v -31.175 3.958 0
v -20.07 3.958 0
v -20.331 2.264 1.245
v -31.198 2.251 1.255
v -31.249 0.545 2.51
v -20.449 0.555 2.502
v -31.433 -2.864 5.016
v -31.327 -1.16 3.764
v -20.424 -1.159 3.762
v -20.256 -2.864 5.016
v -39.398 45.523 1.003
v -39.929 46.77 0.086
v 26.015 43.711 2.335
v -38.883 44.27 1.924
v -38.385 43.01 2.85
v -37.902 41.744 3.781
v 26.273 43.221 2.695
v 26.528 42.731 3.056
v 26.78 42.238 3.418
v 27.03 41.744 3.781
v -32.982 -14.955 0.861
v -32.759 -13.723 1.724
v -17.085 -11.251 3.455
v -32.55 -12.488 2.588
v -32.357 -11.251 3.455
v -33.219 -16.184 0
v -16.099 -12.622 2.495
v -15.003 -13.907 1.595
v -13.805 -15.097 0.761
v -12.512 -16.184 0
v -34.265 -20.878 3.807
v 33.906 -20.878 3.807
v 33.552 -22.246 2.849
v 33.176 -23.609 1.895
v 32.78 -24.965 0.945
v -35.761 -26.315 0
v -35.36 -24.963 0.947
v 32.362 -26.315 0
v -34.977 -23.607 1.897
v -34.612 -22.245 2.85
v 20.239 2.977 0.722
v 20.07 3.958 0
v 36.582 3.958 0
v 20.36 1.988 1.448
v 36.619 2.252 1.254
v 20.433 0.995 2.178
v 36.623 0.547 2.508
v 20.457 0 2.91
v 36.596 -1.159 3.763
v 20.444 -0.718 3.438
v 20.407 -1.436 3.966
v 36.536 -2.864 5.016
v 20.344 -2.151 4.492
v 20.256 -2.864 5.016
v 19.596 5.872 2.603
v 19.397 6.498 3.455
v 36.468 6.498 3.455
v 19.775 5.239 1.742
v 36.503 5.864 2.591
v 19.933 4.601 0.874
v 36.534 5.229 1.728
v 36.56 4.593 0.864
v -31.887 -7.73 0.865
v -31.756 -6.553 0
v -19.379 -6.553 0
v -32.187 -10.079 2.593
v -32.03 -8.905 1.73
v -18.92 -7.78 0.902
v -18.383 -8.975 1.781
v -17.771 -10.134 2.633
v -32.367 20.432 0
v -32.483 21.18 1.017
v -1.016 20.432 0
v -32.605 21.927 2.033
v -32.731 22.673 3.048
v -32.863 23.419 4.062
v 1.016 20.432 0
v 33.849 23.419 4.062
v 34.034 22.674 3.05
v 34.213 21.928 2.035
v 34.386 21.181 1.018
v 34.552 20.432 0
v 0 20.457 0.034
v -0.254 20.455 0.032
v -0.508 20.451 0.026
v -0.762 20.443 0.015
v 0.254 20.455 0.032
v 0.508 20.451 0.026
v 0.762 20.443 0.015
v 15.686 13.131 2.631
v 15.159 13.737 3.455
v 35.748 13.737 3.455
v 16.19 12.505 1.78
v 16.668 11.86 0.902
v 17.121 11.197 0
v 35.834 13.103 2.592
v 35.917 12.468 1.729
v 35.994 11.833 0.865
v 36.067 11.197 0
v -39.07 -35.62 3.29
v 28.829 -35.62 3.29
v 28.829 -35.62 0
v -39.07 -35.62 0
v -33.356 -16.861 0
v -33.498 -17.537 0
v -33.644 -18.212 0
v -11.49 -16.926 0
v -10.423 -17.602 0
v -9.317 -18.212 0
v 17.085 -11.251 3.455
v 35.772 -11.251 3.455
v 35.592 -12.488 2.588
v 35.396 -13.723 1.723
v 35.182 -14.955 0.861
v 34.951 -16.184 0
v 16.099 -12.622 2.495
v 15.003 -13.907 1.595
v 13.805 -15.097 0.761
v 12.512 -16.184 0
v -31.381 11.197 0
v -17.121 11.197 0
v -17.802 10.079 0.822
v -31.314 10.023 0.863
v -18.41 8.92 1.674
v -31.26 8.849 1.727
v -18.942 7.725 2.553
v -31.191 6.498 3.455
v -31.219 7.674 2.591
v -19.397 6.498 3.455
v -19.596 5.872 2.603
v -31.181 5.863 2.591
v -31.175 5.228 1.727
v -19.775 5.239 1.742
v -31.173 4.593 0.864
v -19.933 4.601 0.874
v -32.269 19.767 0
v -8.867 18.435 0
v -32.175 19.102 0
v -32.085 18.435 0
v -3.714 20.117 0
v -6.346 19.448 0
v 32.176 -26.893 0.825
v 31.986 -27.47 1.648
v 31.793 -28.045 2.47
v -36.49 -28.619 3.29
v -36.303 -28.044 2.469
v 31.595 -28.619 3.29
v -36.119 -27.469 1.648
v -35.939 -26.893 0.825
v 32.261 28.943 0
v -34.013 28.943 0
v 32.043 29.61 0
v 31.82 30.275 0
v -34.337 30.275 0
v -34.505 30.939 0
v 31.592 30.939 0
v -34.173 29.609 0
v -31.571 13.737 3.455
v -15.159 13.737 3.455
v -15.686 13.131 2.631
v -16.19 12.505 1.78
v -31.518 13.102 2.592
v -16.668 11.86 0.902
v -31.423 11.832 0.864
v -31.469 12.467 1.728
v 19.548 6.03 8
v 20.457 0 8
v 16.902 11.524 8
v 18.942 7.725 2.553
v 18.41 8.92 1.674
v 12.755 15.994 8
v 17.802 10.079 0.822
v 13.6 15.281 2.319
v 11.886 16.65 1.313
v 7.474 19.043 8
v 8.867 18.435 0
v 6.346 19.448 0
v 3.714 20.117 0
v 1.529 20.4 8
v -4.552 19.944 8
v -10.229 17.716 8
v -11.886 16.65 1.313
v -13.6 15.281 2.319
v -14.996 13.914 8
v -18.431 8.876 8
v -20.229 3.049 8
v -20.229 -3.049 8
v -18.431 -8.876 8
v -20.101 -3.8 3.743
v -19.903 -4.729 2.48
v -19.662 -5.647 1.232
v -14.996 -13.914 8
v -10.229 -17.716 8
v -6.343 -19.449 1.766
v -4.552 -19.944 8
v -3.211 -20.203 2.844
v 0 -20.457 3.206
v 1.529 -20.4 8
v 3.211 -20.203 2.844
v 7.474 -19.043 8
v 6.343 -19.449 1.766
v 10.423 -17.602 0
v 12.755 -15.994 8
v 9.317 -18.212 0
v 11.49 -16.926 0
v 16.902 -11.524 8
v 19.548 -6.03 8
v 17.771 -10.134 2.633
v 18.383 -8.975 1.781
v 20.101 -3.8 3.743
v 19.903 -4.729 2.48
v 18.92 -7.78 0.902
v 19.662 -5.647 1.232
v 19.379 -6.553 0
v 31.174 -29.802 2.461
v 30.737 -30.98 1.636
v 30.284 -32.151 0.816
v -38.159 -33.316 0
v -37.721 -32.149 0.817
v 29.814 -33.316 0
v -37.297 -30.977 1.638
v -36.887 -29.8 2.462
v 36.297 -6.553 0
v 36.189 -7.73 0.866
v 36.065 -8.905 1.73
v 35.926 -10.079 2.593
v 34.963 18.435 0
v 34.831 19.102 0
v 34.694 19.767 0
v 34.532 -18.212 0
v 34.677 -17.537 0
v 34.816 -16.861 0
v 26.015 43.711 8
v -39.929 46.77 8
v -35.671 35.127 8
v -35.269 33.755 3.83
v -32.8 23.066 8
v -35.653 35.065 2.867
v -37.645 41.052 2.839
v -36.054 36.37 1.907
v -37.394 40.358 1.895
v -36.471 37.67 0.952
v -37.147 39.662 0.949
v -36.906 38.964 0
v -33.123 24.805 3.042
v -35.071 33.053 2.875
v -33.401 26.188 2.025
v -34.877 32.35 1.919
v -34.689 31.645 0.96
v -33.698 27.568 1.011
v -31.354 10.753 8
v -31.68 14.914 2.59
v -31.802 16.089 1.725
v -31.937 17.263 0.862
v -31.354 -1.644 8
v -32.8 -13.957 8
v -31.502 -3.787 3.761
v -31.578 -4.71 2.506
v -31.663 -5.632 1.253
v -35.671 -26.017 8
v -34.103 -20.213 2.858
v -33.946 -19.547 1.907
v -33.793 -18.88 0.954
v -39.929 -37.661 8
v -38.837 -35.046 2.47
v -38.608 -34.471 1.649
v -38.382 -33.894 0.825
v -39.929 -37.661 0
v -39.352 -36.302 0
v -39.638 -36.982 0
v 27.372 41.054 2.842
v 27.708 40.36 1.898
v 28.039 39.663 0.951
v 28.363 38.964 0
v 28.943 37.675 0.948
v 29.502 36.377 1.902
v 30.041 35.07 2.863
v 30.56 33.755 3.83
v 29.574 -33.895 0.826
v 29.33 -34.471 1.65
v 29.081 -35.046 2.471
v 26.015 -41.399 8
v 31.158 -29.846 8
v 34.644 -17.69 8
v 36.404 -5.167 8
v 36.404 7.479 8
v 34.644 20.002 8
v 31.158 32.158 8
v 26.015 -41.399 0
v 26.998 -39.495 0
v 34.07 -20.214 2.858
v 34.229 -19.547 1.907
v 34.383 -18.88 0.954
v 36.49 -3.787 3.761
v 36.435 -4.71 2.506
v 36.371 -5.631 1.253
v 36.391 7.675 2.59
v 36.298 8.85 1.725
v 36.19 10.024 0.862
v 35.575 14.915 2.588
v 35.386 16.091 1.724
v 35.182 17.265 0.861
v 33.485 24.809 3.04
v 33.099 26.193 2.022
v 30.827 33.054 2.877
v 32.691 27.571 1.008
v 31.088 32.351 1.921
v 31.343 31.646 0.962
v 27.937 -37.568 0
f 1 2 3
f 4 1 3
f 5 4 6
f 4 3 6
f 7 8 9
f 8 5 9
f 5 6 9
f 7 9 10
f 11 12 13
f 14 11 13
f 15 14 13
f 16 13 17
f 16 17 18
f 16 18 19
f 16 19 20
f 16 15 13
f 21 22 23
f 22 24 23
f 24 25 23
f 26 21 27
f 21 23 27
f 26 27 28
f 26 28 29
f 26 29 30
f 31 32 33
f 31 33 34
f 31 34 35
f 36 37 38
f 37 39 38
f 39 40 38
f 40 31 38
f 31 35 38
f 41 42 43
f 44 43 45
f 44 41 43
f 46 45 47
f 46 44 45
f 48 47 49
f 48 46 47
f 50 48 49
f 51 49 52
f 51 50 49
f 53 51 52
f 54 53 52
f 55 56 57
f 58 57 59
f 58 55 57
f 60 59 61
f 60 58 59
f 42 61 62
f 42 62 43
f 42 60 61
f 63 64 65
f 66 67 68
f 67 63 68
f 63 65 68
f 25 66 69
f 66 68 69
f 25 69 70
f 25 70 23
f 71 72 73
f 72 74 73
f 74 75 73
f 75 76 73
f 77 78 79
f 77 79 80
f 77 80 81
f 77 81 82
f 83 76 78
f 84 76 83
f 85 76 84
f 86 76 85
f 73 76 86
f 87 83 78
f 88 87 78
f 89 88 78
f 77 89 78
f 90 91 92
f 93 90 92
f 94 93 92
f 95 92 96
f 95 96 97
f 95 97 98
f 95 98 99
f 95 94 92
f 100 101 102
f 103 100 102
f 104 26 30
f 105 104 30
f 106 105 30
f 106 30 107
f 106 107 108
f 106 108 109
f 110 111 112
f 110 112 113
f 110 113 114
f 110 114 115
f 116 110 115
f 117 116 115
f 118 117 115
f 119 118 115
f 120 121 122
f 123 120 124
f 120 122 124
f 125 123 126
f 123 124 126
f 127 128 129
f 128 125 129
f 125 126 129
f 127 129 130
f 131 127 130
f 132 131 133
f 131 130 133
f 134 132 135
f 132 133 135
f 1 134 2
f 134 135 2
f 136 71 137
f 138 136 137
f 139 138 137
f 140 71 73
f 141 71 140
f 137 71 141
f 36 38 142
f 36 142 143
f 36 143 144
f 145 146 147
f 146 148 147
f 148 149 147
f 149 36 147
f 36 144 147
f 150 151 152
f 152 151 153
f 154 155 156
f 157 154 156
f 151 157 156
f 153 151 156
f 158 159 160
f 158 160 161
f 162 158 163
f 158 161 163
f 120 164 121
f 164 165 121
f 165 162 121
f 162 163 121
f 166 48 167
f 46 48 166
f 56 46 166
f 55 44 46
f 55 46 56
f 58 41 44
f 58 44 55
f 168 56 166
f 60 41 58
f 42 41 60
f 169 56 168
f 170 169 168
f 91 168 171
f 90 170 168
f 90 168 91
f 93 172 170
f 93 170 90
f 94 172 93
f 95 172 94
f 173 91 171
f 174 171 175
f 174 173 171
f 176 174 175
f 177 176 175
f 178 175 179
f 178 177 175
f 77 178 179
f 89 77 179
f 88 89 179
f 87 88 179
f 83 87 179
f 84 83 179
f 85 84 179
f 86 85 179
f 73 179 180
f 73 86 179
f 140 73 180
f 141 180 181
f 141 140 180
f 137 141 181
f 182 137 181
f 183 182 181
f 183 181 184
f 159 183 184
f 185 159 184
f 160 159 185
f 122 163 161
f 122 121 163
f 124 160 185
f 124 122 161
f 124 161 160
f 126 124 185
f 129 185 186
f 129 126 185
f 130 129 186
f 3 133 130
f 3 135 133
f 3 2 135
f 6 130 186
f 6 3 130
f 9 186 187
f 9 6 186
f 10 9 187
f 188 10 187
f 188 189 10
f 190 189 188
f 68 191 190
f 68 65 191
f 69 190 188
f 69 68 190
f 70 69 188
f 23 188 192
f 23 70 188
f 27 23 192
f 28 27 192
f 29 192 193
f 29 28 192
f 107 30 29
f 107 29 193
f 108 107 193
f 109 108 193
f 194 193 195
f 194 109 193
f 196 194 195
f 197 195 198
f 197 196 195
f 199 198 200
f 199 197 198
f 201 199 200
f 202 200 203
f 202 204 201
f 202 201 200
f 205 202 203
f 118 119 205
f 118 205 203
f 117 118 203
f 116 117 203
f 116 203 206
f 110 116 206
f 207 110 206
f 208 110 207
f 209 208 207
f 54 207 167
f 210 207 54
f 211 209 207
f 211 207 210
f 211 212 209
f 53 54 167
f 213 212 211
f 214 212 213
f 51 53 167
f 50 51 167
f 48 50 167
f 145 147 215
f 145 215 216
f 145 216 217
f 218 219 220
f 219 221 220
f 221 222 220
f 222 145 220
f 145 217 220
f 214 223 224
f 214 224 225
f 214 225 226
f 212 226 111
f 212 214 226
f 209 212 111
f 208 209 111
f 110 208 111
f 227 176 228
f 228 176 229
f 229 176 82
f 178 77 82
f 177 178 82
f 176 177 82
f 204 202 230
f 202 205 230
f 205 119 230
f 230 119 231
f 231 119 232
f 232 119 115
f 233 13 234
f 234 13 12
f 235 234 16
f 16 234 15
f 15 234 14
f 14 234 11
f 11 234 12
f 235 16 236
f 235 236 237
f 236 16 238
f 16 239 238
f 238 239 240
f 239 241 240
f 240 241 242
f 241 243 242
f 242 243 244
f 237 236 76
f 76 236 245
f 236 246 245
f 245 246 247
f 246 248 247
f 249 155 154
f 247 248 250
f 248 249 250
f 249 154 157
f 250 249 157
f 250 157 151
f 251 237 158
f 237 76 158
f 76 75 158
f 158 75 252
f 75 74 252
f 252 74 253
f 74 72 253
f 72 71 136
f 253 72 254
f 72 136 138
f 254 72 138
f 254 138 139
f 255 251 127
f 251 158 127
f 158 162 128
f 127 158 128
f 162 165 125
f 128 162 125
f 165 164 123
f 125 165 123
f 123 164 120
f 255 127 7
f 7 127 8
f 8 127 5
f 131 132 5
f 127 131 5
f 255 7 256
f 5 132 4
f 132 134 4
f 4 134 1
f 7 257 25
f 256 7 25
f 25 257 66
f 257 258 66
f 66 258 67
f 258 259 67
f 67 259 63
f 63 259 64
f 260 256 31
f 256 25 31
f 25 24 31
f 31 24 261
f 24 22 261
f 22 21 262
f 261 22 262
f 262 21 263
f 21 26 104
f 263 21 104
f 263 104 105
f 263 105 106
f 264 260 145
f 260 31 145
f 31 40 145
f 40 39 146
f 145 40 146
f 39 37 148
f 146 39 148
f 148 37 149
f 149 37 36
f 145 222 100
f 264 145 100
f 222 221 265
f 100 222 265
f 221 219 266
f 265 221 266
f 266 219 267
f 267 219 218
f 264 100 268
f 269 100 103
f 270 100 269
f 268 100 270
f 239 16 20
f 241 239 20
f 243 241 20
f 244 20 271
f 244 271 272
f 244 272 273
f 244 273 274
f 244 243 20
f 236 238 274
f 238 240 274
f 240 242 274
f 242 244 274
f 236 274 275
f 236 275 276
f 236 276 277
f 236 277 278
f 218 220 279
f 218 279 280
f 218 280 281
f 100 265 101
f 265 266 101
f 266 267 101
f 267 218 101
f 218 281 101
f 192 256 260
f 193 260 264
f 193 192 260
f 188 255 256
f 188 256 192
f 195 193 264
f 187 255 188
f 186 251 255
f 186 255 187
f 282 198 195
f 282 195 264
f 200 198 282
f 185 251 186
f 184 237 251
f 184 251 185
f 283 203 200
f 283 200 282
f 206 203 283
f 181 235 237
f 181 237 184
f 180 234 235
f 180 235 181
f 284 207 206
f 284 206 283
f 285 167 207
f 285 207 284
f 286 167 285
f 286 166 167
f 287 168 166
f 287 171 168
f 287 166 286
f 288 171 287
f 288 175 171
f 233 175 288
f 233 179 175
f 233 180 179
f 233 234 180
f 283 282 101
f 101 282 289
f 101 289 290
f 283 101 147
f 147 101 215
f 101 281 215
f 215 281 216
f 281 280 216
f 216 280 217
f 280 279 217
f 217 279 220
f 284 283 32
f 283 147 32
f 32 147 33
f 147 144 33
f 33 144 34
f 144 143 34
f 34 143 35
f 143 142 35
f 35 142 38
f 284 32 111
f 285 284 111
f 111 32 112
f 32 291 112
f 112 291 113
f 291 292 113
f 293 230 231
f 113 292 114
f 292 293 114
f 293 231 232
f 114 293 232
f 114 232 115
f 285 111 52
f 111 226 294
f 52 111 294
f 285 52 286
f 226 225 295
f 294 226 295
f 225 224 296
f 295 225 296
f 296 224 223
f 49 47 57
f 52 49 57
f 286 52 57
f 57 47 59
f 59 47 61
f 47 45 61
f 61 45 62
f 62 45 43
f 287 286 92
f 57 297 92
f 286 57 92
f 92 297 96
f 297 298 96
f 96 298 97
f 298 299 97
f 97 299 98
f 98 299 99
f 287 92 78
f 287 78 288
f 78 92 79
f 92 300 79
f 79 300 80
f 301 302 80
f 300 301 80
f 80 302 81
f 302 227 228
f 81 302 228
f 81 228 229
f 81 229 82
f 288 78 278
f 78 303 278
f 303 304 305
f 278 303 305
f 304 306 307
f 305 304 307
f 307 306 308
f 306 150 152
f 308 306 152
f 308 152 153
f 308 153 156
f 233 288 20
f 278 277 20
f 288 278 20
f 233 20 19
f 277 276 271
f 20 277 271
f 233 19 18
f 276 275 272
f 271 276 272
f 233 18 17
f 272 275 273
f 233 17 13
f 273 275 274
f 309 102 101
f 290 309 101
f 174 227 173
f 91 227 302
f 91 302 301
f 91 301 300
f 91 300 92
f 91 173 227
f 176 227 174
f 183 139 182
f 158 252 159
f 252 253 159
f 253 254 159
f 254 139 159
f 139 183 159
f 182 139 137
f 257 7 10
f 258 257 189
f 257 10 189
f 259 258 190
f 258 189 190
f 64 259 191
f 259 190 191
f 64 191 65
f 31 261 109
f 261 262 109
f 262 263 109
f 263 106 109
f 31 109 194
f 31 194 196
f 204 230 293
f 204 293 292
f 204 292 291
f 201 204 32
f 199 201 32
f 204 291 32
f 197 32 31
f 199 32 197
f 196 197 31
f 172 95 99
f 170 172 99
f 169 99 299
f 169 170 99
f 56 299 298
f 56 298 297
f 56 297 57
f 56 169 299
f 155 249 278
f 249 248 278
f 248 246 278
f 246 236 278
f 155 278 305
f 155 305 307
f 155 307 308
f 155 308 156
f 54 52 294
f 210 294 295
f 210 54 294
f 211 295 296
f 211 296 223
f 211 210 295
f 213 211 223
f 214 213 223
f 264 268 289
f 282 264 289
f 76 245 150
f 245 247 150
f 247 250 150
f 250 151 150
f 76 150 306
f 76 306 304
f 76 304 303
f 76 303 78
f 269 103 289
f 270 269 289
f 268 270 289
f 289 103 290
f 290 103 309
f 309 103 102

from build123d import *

# Parameters (mm, degrees)
F0_R          = 20.4570134616
F1_DEPTH      = 8
F3_DEPTH      = 39.9303750525
F3_DEPTH_BACK = 36.6262506595


with BuildPart() as f1:
    # F0 (on Top) → F1 (new body)
    with BuildSketch(Plane.XY):
        with BuildLine():
            Line((26.0145924985, 43.7105707824), (-39.9293750525, 46.7698224776))
            ThreePointArc((-39.9293750525, 46.7698224776), (-31.1732722705, 4.5545801964), (-39.9293750525, -37.6606620848))
            Line((-39.9293750525, -37.6606620848), (26.0145924985, -41.3985941777))
            ThreePointArc((26.0145924985, -41.3985941777), (36.6252506595, 1.1559883023), (26.0145924985, 43.7105707824))
        make_face()
        Circle(F0_R, mode=Mode.SUBTRACT)
    extrude(amount=F1_DEPTH)

    # F2 (on Right) → F3 (cut, two sides)
    with BuildSketch(Plane.YZ) as f3_sk:
        Polygon((46.8867681921, -9.8310960457), (46.8867681921, 0), (41.7443476617, 3.7811910734), (38.9640604703, 0), (33.7552301478, 3.8300217966), (30.2384872583, -0.9527491568), (23.4185017684, 4.0619454024), (19.7312268381, -0.9527491568), (13.7370294066, 3.4547483798), (11.1967735762, 0), (6.498315167, 3.4547483798), (3.9580593366, 0), (-2.8641208355, 5.0163082959), (-6.5525823368, 0), (-11.251040746, 3.4547483798), (-17.5447277725, -0.9527491568), (-20.8783004803, 3.8074266864), (-26.315116211, 0), (-28.6187960147, 3.2895400561), (-33.3160954238, 0), (-35.6197752275, 3.2895400561), (-35.6197752275, 0), (-36.6019308567, -9.8310960457), align=None)
    extrude(amount=-F3_DEPTH, mode=Mode.SUBTRACT)
    extrude(f3_sk.sketch, amount=F3_DEPTH_BACK, mode=Mode.SUBTRACT)


solid = f1.part
